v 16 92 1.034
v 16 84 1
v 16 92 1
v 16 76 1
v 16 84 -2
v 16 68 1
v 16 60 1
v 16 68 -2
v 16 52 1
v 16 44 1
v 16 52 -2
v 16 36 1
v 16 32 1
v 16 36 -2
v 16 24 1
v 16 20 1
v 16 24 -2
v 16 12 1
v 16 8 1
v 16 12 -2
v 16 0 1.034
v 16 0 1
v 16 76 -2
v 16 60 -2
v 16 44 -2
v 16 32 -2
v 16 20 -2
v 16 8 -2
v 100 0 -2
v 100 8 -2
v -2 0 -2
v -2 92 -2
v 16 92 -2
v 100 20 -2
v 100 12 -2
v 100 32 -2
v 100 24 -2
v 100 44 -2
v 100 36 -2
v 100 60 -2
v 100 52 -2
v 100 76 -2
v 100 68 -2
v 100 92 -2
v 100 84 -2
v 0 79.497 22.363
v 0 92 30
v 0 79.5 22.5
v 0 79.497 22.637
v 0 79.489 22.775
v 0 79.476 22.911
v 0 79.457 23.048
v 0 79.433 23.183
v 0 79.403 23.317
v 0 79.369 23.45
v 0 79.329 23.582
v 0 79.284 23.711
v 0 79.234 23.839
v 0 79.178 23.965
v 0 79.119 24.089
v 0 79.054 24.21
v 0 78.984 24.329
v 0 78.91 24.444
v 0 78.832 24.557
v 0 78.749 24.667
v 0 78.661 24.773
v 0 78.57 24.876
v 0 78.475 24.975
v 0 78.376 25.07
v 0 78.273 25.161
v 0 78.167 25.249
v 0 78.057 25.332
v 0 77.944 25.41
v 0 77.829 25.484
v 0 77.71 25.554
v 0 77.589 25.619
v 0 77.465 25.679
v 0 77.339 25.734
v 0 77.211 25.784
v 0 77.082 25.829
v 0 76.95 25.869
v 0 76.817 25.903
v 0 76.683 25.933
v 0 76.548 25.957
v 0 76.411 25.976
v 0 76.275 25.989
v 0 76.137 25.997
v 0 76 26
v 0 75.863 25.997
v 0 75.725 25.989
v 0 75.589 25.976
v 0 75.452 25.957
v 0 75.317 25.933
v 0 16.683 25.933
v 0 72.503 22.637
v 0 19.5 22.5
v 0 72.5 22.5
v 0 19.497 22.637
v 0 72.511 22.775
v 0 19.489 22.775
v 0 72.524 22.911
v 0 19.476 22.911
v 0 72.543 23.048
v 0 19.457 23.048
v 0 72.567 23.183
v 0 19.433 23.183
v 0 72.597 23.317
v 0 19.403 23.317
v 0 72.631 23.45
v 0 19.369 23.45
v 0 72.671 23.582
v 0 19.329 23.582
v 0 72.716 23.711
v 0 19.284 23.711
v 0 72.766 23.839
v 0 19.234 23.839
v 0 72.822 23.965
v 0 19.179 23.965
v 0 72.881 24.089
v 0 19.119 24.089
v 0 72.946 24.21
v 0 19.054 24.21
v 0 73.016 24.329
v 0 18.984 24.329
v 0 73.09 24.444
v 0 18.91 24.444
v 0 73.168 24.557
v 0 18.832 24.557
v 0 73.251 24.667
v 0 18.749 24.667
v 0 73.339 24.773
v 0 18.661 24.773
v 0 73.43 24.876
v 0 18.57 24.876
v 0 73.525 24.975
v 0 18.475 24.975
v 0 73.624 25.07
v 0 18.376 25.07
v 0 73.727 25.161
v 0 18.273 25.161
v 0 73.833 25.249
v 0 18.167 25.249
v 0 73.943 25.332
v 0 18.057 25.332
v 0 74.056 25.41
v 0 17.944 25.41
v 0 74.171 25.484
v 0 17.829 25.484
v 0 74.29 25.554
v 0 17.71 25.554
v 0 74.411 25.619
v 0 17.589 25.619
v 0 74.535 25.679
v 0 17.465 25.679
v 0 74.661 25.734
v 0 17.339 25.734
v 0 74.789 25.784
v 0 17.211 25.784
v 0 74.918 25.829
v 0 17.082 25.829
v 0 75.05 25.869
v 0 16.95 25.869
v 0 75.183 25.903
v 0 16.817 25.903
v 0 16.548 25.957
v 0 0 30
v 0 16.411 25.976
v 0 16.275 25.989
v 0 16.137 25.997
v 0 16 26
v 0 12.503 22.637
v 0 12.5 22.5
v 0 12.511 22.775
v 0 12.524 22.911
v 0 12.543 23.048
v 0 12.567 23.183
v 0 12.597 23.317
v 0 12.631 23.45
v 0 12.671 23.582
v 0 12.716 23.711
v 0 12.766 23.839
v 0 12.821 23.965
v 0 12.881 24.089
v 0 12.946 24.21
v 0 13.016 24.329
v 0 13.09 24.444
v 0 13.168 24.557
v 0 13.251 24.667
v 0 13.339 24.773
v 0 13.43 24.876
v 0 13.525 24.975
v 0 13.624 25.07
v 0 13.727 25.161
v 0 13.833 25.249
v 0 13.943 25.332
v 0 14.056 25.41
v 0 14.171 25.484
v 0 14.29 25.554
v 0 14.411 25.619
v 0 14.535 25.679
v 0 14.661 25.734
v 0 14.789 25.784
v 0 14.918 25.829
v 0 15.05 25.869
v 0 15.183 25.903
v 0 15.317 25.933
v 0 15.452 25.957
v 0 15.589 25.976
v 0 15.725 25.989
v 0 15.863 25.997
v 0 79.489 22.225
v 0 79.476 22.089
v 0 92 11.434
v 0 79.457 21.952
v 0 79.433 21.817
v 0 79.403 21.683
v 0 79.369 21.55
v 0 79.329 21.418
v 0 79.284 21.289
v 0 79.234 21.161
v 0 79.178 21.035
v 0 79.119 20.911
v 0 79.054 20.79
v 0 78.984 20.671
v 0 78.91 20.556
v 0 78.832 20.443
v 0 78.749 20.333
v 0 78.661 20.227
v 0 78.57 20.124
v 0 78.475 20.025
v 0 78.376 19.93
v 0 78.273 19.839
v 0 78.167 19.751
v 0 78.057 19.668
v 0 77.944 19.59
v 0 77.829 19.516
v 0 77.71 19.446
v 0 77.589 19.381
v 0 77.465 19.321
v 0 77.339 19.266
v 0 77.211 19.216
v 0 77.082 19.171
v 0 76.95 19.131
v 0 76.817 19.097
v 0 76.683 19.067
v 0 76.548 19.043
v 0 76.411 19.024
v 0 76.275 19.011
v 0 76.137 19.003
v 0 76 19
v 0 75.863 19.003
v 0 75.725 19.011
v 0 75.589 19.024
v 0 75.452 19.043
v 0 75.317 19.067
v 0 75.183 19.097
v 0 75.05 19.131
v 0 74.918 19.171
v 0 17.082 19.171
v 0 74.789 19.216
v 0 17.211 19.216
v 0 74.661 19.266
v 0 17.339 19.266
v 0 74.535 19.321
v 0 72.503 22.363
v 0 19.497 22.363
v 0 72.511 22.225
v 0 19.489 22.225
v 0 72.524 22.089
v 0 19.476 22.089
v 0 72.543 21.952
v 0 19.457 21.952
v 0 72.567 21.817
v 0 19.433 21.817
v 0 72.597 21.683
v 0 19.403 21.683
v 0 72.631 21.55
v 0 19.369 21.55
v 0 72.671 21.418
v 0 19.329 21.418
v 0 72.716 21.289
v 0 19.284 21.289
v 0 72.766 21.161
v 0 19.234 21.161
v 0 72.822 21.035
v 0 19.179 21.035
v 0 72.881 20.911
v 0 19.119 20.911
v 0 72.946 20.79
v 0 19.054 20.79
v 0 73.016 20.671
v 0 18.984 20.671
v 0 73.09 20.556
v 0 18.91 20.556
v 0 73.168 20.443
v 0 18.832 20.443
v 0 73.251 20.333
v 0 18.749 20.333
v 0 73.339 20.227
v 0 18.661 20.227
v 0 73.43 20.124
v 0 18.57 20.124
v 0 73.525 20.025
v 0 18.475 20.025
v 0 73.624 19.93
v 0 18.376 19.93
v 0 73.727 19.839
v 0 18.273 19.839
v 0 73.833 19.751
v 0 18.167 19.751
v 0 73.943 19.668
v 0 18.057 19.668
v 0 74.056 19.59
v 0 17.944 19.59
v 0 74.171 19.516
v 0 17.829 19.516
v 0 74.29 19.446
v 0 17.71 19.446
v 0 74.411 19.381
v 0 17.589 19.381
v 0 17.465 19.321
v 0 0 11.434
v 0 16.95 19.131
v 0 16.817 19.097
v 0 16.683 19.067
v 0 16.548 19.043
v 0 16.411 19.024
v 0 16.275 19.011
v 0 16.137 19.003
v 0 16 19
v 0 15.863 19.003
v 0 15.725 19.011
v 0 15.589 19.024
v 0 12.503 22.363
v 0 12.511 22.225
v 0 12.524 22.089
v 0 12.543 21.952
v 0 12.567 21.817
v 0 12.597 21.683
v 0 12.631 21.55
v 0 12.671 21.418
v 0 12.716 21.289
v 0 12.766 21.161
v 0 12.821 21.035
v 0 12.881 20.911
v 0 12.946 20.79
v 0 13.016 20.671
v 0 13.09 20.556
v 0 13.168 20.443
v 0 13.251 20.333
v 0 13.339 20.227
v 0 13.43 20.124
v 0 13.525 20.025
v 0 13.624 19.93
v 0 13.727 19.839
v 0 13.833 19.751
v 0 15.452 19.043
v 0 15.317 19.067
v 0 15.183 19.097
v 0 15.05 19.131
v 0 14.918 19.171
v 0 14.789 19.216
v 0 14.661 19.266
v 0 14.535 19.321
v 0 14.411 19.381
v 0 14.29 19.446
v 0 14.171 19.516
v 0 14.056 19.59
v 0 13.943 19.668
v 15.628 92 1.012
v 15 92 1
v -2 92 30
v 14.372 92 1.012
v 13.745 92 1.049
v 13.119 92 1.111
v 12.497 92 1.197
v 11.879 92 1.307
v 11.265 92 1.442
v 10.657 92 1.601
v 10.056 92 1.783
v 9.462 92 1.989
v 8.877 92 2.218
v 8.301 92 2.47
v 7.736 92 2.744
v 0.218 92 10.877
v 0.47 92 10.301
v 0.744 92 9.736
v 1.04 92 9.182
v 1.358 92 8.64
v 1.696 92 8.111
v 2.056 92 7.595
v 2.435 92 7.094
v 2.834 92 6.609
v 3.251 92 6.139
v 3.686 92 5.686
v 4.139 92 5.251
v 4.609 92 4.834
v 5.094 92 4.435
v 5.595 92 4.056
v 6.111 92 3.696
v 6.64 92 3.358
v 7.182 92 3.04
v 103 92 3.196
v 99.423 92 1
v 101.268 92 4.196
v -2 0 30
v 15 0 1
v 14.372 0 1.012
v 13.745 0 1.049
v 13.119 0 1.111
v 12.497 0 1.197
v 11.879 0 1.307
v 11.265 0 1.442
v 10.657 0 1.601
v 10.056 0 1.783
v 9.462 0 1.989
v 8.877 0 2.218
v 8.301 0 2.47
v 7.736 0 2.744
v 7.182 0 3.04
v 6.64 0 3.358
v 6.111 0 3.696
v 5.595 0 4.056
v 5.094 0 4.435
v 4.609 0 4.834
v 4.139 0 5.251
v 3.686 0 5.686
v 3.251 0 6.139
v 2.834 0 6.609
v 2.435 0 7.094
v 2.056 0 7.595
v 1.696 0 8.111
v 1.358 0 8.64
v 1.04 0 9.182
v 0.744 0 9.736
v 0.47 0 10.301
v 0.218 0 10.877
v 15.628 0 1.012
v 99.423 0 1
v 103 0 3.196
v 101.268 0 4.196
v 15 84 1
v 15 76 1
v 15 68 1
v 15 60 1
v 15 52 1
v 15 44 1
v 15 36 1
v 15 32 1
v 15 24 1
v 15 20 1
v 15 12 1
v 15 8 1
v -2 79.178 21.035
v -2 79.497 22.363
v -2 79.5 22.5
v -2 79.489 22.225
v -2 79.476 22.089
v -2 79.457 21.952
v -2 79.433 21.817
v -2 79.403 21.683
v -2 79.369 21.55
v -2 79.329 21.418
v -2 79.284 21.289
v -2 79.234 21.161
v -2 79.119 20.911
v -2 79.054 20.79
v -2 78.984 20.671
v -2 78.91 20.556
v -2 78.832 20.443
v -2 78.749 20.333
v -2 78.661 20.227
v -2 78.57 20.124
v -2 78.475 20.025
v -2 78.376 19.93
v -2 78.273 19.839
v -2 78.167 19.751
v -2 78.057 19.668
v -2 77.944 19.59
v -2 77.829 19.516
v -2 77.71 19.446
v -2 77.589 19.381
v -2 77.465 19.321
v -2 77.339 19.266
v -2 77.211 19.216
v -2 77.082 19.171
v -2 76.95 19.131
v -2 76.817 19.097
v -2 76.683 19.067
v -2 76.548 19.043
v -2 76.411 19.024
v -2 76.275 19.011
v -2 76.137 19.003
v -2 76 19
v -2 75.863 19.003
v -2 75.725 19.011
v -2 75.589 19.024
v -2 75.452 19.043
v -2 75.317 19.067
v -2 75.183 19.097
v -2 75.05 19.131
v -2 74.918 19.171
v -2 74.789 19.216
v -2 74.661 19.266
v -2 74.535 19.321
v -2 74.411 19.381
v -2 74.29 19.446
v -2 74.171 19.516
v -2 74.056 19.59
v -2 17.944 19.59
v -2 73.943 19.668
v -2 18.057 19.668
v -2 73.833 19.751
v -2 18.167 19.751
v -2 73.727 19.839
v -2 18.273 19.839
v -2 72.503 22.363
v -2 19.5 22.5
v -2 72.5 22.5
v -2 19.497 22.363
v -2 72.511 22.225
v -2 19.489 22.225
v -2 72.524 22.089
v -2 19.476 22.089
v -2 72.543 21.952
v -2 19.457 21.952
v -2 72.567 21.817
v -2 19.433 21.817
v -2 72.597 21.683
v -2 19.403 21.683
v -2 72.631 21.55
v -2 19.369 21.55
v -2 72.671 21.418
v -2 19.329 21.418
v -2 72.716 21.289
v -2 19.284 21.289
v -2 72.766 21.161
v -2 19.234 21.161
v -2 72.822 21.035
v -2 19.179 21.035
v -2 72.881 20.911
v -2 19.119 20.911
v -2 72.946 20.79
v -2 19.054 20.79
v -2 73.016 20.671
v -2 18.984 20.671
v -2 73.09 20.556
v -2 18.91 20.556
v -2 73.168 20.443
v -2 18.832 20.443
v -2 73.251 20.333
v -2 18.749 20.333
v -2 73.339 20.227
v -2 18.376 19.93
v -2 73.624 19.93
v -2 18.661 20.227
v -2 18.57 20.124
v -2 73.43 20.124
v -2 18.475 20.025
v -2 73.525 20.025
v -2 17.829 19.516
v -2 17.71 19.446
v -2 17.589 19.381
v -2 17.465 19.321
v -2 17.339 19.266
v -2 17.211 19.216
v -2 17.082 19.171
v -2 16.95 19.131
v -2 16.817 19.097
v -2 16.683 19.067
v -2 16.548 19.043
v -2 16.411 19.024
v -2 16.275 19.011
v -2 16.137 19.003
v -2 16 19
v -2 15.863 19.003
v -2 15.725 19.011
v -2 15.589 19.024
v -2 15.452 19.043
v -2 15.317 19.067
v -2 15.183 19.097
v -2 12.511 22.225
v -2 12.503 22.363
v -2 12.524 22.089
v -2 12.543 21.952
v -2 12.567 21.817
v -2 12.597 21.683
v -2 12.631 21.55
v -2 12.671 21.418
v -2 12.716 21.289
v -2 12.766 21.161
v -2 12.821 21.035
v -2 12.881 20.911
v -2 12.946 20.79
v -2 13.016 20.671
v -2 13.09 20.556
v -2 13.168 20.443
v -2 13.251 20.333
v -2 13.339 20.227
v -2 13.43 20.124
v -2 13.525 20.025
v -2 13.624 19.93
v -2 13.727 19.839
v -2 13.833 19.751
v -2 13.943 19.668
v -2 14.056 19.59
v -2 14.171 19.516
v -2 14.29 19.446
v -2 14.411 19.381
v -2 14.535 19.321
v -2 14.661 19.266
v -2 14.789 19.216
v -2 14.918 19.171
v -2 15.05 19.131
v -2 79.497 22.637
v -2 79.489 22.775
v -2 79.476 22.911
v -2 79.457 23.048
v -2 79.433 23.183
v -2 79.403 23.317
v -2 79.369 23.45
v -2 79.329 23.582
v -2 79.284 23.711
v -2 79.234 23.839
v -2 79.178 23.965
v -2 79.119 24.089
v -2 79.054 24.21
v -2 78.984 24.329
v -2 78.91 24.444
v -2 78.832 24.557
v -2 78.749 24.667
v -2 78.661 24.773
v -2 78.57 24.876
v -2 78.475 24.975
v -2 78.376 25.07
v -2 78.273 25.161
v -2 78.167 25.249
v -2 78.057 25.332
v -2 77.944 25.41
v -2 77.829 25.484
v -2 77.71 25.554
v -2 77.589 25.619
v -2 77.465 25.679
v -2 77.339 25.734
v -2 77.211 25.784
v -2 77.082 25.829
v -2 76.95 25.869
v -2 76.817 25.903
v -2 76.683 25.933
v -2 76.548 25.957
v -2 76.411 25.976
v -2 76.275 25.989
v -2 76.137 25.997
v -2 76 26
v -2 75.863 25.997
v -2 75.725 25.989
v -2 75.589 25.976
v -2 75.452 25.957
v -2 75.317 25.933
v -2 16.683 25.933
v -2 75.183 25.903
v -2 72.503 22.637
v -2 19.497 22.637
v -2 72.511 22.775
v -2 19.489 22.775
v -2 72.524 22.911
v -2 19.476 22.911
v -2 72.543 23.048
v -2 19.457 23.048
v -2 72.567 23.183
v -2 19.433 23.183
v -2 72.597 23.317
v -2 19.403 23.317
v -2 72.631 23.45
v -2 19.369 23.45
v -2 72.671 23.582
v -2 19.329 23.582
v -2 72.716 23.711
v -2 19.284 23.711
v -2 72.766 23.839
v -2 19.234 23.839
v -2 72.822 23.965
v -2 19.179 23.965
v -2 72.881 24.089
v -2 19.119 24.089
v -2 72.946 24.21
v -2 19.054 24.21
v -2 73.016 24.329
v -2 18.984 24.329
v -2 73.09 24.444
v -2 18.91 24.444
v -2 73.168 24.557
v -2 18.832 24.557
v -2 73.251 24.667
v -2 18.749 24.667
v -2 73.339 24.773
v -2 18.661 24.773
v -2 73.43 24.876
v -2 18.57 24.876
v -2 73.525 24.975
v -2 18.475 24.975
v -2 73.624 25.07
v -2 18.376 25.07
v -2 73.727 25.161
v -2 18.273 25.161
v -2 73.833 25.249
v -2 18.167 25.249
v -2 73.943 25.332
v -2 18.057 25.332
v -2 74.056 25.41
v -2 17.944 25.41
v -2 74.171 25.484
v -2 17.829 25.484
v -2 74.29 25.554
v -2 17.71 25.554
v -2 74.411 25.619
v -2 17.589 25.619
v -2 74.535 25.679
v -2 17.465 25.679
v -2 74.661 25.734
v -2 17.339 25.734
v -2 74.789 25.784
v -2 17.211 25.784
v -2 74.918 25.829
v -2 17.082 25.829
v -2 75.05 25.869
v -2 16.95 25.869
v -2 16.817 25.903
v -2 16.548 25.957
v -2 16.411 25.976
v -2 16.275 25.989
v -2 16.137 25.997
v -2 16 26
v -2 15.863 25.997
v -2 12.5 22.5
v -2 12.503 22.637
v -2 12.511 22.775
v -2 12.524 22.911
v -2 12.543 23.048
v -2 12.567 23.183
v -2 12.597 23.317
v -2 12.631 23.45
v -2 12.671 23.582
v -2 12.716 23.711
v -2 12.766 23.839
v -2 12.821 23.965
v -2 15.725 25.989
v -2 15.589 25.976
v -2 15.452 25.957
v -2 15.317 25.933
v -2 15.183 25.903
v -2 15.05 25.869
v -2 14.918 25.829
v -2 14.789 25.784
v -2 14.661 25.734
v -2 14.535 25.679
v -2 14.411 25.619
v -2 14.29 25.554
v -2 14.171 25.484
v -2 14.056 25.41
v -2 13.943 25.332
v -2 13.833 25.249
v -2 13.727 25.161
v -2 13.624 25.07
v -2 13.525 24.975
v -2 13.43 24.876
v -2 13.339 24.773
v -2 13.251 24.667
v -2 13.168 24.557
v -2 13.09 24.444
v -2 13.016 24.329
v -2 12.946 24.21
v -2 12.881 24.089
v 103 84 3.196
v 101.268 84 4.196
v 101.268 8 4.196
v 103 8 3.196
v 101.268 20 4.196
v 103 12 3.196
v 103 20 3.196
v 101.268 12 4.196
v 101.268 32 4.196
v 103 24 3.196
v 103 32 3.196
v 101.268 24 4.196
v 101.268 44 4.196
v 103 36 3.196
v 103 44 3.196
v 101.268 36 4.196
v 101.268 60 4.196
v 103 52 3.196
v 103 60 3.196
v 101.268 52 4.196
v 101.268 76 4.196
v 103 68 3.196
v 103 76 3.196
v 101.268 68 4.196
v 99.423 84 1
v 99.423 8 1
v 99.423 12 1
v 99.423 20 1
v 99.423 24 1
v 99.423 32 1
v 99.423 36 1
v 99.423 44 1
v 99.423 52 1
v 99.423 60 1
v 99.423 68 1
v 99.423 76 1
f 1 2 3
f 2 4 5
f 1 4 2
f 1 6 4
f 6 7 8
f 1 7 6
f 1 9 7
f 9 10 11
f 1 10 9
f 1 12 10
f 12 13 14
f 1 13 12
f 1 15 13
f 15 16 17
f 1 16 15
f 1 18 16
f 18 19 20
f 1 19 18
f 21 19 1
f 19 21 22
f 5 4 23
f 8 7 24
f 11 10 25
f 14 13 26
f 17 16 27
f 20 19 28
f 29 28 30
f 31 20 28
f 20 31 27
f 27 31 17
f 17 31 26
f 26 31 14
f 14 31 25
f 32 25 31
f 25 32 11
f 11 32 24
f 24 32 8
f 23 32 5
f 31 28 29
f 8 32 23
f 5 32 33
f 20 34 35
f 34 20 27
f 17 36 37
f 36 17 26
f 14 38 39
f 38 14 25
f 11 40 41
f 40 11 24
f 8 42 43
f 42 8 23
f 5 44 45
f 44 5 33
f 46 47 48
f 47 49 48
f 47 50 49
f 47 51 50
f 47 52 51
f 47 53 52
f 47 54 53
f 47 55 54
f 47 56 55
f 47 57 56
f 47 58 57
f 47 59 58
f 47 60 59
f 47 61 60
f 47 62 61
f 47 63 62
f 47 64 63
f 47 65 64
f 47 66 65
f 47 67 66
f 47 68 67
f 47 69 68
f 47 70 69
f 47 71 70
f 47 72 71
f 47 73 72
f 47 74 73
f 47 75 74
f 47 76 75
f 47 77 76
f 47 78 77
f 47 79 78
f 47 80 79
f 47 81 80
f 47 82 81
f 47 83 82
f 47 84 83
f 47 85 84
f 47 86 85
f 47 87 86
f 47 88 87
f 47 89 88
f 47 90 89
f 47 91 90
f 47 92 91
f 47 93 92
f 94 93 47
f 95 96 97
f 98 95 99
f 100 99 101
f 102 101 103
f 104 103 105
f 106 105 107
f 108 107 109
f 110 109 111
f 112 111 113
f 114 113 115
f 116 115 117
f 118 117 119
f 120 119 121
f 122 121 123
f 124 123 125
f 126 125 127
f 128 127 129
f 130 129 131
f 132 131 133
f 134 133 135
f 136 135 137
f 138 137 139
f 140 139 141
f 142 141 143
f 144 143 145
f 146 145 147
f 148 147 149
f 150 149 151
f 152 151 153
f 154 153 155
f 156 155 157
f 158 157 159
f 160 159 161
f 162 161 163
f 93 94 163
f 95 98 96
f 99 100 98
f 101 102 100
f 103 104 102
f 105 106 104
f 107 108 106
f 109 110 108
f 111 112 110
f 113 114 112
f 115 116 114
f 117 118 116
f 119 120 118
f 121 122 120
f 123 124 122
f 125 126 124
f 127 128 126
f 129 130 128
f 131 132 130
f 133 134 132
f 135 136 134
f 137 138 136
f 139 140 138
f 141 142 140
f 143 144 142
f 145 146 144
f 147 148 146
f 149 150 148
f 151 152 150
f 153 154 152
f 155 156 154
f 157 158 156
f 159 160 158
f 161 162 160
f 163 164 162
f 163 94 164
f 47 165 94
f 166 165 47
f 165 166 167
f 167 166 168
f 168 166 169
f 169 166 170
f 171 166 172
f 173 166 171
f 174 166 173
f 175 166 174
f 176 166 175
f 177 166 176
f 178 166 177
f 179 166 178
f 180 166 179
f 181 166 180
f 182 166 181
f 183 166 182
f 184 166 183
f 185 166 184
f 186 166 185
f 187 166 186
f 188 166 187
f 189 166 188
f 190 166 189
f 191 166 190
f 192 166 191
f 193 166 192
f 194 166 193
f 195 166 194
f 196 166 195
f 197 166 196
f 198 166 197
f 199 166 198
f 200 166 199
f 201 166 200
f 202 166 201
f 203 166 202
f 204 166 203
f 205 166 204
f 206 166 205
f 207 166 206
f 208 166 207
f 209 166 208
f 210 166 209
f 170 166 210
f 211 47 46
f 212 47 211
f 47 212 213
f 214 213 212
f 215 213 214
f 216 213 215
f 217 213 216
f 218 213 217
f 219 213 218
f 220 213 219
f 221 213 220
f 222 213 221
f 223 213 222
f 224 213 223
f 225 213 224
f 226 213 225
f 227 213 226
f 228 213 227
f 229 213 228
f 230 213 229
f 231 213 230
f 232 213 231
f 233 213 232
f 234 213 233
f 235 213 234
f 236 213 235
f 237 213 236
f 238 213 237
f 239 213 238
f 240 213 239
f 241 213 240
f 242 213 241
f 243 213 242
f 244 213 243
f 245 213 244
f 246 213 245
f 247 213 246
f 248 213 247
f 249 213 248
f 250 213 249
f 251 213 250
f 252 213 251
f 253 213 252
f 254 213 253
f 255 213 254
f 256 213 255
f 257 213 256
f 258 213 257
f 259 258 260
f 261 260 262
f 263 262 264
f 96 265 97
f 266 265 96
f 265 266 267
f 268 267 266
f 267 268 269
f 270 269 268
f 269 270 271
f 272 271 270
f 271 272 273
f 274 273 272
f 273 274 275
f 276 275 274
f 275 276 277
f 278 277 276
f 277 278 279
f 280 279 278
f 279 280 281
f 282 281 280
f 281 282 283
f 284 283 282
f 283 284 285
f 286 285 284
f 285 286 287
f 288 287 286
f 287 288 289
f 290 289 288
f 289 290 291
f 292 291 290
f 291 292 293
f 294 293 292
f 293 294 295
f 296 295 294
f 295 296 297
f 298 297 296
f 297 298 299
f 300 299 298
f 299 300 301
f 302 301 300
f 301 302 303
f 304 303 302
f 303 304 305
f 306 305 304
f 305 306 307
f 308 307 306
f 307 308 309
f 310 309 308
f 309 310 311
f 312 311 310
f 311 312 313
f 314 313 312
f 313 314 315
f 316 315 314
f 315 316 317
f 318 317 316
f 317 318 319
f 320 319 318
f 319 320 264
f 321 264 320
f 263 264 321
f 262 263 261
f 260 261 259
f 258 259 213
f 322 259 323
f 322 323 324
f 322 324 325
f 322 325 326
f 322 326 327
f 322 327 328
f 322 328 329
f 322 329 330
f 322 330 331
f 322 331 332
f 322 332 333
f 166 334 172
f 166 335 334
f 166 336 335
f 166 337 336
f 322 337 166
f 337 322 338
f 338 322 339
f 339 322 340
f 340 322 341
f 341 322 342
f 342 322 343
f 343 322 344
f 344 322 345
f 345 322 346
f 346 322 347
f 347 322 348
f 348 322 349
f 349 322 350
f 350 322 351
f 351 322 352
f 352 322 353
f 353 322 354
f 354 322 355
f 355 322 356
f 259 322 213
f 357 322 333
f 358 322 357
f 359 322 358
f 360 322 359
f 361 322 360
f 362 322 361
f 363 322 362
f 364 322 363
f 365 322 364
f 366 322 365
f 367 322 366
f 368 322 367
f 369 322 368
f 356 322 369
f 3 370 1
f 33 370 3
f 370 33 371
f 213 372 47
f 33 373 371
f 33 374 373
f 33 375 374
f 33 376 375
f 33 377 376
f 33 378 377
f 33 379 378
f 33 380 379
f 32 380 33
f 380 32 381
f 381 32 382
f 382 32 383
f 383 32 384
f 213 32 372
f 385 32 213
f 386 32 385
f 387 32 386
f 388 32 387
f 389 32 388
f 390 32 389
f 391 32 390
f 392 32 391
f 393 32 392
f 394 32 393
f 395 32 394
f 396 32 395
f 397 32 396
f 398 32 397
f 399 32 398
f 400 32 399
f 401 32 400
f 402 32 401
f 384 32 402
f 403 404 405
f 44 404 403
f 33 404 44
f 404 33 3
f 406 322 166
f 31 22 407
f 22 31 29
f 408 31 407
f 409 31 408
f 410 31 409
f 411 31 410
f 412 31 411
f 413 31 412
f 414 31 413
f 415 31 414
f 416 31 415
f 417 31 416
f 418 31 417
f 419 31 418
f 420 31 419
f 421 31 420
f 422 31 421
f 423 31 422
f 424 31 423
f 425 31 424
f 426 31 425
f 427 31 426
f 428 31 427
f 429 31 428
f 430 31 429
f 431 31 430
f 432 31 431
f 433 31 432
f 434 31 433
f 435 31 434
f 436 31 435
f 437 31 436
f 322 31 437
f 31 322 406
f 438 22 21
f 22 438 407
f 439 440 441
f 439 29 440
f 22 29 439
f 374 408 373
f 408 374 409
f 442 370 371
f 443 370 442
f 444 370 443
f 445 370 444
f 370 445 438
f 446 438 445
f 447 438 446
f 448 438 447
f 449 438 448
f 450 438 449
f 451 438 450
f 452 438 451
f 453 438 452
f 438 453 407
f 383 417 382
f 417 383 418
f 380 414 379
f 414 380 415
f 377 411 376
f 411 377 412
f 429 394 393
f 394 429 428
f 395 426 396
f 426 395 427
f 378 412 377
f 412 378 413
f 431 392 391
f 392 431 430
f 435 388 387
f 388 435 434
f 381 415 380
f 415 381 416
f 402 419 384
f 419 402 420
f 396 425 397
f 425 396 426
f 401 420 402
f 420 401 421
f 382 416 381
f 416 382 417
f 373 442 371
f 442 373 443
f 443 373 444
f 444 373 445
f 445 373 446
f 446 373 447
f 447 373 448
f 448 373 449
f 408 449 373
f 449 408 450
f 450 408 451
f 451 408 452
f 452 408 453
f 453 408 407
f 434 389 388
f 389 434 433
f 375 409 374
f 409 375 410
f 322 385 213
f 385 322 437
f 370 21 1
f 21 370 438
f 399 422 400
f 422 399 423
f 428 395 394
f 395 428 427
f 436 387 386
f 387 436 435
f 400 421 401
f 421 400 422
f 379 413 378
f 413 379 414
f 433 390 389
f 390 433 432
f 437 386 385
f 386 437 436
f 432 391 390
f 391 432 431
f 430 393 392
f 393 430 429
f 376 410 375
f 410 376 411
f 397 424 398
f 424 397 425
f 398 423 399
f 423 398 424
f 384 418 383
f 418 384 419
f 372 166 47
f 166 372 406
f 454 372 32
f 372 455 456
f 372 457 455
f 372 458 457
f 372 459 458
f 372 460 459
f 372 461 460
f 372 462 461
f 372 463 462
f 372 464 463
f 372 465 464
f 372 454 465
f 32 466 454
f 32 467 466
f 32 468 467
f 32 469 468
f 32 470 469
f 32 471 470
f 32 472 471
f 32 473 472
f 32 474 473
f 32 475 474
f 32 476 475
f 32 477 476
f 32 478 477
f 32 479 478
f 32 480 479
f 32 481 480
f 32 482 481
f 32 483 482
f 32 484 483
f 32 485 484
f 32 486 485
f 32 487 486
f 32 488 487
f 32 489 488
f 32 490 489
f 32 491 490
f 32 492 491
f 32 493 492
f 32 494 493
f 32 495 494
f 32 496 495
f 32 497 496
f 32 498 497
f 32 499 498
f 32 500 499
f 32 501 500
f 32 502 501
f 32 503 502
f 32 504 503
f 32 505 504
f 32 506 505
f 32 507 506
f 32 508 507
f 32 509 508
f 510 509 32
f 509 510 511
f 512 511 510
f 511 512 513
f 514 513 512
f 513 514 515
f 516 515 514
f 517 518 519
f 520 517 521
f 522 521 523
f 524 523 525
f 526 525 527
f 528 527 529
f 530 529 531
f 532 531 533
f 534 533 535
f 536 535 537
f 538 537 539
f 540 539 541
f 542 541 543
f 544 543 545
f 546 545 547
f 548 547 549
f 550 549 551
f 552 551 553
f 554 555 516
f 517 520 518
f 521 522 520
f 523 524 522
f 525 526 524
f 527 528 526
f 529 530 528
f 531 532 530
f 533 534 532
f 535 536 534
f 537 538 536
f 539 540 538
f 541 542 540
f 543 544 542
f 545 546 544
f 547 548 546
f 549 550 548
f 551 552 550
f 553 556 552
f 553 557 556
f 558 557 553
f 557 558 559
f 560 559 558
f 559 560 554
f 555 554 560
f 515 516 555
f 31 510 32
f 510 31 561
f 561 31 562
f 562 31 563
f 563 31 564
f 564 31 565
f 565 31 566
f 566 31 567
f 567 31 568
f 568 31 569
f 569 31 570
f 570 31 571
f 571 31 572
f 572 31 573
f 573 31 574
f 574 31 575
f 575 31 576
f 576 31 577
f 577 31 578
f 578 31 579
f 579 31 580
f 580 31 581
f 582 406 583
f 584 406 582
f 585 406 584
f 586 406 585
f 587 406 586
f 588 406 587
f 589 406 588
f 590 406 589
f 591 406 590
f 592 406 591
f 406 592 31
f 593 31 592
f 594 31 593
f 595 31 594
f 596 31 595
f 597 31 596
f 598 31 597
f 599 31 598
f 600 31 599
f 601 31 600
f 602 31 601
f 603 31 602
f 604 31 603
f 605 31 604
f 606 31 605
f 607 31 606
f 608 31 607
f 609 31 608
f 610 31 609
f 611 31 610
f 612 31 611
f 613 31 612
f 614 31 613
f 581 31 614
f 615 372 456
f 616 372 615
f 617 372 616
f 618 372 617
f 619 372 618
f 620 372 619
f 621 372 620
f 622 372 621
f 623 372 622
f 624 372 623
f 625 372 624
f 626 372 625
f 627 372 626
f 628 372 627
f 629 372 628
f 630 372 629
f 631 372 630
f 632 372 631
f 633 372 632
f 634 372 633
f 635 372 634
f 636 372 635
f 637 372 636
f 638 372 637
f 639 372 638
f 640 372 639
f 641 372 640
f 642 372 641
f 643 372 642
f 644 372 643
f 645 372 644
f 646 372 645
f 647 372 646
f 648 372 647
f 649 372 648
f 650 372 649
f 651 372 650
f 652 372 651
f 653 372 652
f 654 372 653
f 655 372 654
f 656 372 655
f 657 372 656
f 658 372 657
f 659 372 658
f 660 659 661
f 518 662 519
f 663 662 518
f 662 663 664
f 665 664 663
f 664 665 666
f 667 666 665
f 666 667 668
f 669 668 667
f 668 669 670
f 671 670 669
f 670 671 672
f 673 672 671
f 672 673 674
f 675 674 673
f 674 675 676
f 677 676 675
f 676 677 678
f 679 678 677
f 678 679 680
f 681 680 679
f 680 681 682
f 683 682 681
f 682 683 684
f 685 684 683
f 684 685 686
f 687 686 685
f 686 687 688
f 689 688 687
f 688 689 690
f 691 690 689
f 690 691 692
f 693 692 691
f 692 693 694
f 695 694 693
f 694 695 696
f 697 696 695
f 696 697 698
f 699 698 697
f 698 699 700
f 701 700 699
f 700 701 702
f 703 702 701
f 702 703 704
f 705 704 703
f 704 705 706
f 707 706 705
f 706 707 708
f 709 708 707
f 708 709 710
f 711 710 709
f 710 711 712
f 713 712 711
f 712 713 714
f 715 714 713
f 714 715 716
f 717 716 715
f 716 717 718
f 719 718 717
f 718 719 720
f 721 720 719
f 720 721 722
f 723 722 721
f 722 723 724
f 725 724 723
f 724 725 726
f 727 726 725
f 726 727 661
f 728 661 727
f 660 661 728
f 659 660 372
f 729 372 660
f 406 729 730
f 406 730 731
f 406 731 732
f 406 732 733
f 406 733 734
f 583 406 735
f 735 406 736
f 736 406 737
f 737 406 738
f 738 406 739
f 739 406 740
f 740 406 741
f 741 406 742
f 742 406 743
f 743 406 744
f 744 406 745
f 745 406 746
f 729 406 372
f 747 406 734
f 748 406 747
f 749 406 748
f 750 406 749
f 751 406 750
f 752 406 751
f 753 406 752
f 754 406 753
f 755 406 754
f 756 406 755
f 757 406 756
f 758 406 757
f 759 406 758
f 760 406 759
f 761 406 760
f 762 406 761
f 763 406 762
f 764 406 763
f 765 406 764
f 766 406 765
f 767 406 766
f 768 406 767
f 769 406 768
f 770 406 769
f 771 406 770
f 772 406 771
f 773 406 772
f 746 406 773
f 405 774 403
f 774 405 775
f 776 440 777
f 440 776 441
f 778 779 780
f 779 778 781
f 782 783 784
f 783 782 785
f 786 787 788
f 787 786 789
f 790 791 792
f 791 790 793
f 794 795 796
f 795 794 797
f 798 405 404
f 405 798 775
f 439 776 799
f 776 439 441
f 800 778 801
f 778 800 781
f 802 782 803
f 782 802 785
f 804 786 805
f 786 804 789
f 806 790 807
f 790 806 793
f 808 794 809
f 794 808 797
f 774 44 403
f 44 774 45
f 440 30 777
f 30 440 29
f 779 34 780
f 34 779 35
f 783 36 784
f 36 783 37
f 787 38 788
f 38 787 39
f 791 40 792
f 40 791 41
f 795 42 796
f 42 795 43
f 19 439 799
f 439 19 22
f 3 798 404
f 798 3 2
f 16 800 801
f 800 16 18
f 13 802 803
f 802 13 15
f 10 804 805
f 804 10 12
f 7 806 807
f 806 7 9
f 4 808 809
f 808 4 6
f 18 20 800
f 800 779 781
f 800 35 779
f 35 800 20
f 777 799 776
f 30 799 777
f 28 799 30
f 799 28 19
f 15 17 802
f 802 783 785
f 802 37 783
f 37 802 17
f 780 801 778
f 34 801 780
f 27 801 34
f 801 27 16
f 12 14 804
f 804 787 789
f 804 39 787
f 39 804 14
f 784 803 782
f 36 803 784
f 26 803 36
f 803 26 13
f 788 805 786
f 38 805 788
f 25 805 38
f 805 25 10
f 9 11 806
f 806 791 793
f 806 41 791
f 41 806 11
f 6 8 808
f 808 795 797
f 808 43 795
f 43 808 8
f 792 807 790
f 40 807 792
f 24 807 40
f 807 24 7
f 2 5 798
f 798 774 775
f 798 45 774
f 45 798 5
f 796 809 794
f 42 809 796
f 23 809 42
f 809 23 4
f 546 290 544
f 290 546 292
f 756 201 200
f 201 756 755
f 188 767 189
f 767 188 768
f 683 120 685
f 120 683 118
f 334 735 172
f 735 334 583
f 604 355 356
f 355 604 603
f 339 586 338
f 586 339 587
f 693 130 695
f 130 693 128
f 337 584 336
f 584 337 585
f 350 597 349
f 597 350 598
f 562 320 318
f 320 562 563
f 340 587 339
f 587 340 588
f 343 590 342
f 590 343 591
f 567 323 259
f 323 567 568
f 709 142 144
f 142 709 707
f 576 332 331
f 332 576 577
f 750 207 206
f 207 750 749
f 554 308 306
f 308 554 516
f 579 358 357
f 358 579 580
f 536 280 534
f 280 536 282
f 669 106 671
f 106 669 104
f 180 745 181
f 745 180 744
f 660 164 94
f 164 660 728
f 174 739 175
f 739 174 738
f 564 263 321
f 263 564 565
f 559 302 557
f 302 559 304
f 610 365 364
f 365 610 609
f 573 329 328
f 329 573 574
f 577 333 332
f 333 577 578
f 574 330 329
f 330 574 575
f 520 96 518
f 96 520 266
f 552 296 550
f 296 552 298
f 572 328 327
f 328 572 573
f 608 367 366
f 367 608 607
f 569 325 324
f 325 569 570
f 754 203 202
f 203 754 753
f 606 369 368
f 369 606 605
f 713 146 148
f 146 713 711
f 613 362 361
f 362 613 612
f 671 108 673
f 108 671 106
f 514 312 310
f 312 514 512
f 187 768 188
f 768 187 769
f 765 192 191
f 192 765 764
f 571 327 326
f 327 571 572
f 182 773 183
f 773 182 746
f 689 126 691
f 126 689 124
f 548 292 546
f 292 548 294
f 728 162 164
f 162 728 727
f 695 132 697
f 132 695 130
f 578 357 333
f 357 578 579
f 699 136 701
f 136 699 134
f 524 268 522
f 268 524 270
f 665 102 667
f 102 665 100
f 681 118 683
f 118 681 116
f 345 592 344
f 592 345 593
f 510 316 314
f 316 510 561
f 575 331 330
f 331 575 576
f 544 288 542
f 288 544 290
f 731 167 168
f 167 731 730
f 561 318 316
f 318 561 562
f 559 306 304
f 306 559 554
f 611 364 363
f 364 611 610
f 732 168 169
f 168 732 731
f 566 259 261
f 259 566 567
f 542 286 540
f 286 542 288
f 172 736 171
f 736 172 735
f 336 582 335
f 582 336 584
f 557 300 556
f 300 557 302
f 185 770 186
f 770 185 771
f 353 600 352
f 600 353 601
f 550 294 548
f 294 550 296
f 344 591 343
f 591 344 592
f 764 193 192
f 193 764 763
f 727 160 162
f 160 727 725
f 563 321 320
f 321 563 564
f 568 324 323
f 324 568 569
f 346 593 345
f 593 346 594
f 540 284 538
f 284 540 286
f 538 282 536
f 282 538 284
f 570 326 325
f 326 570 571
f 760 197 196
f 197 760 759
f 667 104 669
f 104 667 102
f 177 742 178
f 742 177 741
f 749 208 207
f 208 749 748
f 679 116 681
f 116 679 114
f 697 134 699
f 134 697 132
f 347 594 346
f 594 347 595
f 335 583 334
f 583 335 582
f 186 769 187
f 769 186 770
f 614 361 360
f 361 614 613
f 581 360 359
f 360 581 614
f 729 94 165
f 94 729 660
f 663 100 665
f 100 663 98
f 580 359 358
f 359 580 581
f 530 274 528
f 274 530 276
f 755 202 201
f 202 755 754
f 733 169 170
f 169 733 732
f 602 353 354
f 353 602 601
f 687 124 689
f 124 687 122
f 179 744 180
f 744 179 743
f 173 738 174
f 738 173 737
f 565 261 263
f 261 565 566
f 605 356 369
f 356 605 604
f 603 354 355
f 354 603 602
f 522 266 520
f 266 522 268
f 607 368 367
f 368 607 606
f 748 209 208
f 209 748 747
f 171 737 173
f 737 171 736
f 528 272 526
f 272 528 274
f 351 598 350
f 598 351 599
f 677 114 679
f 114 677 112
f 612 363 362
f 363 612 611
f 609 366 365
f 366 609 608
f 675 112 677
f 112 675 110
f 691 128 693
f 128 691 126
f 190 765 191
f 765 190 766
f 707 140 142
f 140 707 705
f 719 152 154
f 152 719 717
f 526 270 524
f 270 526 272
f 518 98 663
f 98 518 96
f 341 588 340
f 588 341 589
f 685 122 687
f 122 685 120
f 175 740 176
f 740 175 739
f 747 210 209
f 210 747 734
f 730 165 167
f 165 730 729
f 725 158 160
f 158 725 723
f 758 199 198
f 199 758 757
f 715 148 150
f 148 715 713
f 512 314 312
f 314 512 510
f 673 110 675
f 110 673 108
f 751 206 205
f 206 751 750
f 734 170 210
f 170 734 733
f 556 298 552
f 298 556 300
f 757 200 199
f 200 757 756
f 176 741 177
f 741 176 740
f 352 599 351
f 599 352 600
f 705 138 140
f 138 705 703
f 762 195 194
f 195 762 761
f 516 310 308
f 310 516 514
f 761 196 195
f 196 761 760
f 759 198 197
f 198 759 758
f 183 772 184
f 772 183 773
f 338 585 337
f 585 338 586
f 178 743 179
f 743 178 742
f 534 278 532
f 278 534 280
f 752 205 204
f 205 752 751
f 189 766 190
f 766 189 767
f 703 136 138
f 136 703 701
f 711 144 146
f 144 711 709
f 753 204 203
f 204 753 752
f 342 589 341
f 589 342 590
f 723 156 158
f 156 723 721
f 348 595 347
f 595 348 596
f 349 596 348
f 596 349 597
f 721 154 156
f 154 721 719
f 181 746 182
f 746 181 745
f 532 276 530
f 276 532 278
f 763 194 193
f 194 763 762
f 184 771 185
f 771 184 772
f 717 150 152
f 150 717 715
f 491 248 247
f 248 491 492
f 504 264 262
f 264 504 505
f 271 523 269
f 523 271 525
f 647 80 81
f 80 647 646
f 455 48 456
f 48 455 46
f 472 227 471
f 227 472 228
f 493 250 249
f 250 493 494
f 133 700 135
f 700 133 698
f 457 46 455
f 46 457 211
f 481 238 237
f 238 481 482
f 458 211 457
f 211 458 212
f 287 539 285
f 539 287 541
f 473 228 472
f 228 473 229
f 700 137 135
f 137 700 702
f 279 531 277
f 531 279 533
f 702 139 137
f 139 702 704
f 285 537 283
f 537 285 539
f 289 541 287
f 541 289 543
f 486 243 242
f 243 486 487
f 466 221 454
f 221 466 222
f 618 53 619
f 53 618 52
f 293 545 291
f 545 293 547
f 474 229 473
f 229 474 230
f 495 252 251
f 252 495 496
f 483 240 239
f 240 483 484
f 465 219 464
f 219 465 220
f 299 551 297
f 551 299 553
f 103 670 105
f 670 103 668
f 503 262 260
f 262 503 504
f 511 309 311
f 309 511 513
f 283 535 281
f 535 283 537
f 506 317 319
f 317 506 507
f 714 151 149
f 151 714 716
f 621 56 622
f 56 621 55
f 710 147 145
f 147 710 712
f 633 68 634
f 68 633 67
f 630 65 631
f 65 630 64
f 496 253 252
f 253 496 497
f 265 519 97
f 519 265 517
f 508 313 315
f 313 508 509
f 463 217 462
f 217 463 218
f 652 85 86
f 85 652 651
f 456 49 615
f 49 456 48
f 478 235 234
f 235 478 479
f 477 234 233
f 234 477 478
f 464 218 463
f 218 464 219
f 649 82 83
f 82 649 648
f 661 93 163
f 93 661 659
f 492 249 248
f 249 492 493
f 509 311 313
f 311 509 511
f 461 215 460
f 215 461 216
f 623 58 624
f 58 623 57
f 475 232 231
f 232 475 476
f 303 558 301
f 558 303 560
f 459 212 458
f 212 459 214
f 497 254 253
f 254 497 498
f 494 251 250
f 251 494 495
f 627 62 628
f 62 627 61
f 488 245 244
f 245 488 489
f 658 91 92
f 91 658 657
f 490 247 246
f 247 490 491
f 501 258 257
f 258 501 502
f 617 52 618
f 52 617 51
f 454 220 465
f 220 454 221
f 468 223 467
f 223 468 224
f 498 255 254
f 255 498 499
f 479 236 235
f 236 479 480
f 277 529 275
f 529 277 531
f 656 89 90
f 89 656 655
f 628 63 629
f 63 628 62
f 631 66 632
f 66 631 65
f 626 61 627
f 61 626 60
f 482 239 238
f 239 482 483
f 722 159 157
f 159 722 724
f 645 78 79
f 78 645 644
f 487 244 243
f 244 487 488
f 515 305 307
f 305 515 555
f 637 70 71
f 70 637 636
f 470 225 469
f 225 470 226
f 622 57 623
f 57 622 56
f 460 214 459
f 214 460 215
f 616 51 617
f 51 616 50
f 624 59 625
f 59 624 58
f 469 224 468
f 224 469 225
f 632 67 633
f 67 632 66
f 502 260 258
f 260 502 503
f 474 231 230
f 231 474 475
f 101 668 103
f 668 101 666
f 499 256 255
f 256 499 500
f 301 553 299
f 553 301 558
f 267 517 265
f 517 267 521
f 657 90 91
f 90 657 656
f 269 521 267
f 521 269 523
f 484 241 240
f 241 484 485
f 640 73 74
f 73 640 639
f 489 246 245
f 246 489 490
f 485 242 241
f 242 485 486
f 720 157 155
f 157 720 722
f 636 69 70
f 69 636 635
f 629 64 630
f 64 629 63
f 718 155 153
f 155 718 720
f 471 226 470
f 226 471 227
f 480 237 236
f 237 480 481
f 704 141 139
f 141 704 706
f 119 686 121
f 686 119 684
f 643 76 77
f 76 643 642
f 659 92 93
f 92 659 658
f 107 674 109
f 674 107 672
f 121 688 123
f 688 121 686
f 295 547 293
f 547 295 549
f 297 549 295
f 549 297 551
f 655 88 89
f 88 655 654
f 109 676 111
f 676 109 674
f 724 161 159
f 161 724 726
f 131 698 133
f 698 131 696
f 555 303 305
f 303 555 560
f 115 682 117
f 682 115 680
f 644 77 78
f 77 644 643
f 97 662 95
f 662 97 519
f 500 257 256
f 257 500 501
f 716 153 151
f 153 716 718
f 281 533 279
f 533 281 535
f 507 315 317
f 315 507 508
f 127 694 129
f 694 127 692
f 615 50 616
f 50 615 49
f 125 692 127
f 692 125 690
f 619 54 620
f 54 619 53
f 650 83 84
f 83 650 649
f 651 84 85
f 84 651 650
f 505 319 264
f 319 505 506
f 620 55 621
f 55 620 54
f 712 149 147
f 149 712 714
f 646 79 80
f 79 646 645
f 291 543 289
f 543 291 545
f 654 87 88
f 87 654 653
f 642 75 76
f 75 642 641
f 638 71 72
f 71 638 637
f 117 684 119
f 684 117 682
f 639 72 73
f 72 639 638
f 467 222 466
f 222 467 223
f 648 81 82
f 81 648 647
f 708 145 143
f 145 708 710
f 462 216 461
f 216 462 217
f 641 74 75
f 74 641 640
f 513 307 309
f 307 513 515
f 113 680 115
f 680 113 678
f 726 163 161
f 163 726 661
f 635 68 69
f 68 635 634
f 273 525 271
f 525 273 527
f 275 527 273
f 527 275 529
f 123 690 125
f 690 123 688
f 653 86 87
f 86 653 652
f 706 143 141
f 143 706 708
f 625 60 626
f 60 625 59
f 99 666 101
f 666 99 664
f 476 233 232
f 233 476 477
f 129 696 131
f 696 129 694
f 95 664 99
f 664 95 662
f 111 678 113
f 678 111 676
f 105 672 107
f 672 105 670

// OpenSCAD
// Created  by James Trimble - keybase.io/jamestrimble
// Released under Creative Commons - Attribution - Share Alike license

// preview[view:north east, tilt:top diagonal]
Number_Of_4mm_Slots = 3;
Number_Of_8mm_Slots = 3;
Reenforcement = true; //[true,false]


cablerack(Number_Of_4mm_Slots,Number_Of_8mm_Slots,Reenforcement);

module cablerack(num4mm, num8mm, reenforcements) {
	$fn = max($fn, 160);
	spacing = 8;
	thickness = 3;
	backHeight = 30;
	fingerLength = 100;
	rackWidth = num4mm*4+num8mm*8+(2+(num4mm+num8mm-1))*spacing;
	screwHoleRadius = 3.5;
	loc = 8;
	rsize = 16;

	
	difference() {
		union() {
			if (reenforcements==true) {
				// Create the re-enforcement area
				difference() { 
					translate([0,0,-2]) cube([rsize,rackWidth,rsize]);
					translate([rsize-1,-4,rsize+1]) rotate([-90,0,0]) cylinder(r=16,h=rackWidth*2, center=false);
				}
			}

			difference() {
				// Create the solid cable rack
				union() {
					translate([-2,0,0]) cube([2,rackWidth,backHeight]); // back plate
					translate([fingerLength,0,-2]) rotate([0,-60,0]) cube([6,rackWidth,2]); // edge lip
					translate([-2,0,1]) rotate ([0,90,0]) cube([3,rackWidth,fingerLength+2]);
				}

				// subtract the slots
				for (i4mm = [loc:4+spacing:loc+(4+spacing)*num4mm]) {
					translate([1,i4mm,-8]) cube([2*fingerLength,4,2*backHeight]);
				}

				for (i8mm = [loc+(4+spacing)*num4mm:8+spacing:(loc+(4+spacing)*num4mm)+((8+spacing)*num8mm)]) {
					translate([1,i8mm,-8]) cube([2*fingerLength,8,2*backHeight]);
				}
			}
		}
		
		// create the screw holes
		if (num4mm+num8mm<=2) {
			translate([0,rackWidth/2,backHeight-1.5*screwHoleRadius]) rotate([0,90,0]) cylinder(r=screwHoleRadius,h=thickness*3, center=true);
			translate([0,rackWidth/2,backHeight/2]) rotate([0,90,0]) cylinder(r=screwHoleRadius,h=thickness*3, center=true);
		} else {
			translate([0,2*spacing,backHeight*.75]) rotate([0,90,0]) cylinder(r=screwHoleRadius,h=thickness*3, center=true);
			translate([0,rackWidth-2*spacing,backHeight*.75]) rotate([0,90,0]) cylinder(r=screwHoleRadius,h=thickness*3, center=true);
		}

	}
}
